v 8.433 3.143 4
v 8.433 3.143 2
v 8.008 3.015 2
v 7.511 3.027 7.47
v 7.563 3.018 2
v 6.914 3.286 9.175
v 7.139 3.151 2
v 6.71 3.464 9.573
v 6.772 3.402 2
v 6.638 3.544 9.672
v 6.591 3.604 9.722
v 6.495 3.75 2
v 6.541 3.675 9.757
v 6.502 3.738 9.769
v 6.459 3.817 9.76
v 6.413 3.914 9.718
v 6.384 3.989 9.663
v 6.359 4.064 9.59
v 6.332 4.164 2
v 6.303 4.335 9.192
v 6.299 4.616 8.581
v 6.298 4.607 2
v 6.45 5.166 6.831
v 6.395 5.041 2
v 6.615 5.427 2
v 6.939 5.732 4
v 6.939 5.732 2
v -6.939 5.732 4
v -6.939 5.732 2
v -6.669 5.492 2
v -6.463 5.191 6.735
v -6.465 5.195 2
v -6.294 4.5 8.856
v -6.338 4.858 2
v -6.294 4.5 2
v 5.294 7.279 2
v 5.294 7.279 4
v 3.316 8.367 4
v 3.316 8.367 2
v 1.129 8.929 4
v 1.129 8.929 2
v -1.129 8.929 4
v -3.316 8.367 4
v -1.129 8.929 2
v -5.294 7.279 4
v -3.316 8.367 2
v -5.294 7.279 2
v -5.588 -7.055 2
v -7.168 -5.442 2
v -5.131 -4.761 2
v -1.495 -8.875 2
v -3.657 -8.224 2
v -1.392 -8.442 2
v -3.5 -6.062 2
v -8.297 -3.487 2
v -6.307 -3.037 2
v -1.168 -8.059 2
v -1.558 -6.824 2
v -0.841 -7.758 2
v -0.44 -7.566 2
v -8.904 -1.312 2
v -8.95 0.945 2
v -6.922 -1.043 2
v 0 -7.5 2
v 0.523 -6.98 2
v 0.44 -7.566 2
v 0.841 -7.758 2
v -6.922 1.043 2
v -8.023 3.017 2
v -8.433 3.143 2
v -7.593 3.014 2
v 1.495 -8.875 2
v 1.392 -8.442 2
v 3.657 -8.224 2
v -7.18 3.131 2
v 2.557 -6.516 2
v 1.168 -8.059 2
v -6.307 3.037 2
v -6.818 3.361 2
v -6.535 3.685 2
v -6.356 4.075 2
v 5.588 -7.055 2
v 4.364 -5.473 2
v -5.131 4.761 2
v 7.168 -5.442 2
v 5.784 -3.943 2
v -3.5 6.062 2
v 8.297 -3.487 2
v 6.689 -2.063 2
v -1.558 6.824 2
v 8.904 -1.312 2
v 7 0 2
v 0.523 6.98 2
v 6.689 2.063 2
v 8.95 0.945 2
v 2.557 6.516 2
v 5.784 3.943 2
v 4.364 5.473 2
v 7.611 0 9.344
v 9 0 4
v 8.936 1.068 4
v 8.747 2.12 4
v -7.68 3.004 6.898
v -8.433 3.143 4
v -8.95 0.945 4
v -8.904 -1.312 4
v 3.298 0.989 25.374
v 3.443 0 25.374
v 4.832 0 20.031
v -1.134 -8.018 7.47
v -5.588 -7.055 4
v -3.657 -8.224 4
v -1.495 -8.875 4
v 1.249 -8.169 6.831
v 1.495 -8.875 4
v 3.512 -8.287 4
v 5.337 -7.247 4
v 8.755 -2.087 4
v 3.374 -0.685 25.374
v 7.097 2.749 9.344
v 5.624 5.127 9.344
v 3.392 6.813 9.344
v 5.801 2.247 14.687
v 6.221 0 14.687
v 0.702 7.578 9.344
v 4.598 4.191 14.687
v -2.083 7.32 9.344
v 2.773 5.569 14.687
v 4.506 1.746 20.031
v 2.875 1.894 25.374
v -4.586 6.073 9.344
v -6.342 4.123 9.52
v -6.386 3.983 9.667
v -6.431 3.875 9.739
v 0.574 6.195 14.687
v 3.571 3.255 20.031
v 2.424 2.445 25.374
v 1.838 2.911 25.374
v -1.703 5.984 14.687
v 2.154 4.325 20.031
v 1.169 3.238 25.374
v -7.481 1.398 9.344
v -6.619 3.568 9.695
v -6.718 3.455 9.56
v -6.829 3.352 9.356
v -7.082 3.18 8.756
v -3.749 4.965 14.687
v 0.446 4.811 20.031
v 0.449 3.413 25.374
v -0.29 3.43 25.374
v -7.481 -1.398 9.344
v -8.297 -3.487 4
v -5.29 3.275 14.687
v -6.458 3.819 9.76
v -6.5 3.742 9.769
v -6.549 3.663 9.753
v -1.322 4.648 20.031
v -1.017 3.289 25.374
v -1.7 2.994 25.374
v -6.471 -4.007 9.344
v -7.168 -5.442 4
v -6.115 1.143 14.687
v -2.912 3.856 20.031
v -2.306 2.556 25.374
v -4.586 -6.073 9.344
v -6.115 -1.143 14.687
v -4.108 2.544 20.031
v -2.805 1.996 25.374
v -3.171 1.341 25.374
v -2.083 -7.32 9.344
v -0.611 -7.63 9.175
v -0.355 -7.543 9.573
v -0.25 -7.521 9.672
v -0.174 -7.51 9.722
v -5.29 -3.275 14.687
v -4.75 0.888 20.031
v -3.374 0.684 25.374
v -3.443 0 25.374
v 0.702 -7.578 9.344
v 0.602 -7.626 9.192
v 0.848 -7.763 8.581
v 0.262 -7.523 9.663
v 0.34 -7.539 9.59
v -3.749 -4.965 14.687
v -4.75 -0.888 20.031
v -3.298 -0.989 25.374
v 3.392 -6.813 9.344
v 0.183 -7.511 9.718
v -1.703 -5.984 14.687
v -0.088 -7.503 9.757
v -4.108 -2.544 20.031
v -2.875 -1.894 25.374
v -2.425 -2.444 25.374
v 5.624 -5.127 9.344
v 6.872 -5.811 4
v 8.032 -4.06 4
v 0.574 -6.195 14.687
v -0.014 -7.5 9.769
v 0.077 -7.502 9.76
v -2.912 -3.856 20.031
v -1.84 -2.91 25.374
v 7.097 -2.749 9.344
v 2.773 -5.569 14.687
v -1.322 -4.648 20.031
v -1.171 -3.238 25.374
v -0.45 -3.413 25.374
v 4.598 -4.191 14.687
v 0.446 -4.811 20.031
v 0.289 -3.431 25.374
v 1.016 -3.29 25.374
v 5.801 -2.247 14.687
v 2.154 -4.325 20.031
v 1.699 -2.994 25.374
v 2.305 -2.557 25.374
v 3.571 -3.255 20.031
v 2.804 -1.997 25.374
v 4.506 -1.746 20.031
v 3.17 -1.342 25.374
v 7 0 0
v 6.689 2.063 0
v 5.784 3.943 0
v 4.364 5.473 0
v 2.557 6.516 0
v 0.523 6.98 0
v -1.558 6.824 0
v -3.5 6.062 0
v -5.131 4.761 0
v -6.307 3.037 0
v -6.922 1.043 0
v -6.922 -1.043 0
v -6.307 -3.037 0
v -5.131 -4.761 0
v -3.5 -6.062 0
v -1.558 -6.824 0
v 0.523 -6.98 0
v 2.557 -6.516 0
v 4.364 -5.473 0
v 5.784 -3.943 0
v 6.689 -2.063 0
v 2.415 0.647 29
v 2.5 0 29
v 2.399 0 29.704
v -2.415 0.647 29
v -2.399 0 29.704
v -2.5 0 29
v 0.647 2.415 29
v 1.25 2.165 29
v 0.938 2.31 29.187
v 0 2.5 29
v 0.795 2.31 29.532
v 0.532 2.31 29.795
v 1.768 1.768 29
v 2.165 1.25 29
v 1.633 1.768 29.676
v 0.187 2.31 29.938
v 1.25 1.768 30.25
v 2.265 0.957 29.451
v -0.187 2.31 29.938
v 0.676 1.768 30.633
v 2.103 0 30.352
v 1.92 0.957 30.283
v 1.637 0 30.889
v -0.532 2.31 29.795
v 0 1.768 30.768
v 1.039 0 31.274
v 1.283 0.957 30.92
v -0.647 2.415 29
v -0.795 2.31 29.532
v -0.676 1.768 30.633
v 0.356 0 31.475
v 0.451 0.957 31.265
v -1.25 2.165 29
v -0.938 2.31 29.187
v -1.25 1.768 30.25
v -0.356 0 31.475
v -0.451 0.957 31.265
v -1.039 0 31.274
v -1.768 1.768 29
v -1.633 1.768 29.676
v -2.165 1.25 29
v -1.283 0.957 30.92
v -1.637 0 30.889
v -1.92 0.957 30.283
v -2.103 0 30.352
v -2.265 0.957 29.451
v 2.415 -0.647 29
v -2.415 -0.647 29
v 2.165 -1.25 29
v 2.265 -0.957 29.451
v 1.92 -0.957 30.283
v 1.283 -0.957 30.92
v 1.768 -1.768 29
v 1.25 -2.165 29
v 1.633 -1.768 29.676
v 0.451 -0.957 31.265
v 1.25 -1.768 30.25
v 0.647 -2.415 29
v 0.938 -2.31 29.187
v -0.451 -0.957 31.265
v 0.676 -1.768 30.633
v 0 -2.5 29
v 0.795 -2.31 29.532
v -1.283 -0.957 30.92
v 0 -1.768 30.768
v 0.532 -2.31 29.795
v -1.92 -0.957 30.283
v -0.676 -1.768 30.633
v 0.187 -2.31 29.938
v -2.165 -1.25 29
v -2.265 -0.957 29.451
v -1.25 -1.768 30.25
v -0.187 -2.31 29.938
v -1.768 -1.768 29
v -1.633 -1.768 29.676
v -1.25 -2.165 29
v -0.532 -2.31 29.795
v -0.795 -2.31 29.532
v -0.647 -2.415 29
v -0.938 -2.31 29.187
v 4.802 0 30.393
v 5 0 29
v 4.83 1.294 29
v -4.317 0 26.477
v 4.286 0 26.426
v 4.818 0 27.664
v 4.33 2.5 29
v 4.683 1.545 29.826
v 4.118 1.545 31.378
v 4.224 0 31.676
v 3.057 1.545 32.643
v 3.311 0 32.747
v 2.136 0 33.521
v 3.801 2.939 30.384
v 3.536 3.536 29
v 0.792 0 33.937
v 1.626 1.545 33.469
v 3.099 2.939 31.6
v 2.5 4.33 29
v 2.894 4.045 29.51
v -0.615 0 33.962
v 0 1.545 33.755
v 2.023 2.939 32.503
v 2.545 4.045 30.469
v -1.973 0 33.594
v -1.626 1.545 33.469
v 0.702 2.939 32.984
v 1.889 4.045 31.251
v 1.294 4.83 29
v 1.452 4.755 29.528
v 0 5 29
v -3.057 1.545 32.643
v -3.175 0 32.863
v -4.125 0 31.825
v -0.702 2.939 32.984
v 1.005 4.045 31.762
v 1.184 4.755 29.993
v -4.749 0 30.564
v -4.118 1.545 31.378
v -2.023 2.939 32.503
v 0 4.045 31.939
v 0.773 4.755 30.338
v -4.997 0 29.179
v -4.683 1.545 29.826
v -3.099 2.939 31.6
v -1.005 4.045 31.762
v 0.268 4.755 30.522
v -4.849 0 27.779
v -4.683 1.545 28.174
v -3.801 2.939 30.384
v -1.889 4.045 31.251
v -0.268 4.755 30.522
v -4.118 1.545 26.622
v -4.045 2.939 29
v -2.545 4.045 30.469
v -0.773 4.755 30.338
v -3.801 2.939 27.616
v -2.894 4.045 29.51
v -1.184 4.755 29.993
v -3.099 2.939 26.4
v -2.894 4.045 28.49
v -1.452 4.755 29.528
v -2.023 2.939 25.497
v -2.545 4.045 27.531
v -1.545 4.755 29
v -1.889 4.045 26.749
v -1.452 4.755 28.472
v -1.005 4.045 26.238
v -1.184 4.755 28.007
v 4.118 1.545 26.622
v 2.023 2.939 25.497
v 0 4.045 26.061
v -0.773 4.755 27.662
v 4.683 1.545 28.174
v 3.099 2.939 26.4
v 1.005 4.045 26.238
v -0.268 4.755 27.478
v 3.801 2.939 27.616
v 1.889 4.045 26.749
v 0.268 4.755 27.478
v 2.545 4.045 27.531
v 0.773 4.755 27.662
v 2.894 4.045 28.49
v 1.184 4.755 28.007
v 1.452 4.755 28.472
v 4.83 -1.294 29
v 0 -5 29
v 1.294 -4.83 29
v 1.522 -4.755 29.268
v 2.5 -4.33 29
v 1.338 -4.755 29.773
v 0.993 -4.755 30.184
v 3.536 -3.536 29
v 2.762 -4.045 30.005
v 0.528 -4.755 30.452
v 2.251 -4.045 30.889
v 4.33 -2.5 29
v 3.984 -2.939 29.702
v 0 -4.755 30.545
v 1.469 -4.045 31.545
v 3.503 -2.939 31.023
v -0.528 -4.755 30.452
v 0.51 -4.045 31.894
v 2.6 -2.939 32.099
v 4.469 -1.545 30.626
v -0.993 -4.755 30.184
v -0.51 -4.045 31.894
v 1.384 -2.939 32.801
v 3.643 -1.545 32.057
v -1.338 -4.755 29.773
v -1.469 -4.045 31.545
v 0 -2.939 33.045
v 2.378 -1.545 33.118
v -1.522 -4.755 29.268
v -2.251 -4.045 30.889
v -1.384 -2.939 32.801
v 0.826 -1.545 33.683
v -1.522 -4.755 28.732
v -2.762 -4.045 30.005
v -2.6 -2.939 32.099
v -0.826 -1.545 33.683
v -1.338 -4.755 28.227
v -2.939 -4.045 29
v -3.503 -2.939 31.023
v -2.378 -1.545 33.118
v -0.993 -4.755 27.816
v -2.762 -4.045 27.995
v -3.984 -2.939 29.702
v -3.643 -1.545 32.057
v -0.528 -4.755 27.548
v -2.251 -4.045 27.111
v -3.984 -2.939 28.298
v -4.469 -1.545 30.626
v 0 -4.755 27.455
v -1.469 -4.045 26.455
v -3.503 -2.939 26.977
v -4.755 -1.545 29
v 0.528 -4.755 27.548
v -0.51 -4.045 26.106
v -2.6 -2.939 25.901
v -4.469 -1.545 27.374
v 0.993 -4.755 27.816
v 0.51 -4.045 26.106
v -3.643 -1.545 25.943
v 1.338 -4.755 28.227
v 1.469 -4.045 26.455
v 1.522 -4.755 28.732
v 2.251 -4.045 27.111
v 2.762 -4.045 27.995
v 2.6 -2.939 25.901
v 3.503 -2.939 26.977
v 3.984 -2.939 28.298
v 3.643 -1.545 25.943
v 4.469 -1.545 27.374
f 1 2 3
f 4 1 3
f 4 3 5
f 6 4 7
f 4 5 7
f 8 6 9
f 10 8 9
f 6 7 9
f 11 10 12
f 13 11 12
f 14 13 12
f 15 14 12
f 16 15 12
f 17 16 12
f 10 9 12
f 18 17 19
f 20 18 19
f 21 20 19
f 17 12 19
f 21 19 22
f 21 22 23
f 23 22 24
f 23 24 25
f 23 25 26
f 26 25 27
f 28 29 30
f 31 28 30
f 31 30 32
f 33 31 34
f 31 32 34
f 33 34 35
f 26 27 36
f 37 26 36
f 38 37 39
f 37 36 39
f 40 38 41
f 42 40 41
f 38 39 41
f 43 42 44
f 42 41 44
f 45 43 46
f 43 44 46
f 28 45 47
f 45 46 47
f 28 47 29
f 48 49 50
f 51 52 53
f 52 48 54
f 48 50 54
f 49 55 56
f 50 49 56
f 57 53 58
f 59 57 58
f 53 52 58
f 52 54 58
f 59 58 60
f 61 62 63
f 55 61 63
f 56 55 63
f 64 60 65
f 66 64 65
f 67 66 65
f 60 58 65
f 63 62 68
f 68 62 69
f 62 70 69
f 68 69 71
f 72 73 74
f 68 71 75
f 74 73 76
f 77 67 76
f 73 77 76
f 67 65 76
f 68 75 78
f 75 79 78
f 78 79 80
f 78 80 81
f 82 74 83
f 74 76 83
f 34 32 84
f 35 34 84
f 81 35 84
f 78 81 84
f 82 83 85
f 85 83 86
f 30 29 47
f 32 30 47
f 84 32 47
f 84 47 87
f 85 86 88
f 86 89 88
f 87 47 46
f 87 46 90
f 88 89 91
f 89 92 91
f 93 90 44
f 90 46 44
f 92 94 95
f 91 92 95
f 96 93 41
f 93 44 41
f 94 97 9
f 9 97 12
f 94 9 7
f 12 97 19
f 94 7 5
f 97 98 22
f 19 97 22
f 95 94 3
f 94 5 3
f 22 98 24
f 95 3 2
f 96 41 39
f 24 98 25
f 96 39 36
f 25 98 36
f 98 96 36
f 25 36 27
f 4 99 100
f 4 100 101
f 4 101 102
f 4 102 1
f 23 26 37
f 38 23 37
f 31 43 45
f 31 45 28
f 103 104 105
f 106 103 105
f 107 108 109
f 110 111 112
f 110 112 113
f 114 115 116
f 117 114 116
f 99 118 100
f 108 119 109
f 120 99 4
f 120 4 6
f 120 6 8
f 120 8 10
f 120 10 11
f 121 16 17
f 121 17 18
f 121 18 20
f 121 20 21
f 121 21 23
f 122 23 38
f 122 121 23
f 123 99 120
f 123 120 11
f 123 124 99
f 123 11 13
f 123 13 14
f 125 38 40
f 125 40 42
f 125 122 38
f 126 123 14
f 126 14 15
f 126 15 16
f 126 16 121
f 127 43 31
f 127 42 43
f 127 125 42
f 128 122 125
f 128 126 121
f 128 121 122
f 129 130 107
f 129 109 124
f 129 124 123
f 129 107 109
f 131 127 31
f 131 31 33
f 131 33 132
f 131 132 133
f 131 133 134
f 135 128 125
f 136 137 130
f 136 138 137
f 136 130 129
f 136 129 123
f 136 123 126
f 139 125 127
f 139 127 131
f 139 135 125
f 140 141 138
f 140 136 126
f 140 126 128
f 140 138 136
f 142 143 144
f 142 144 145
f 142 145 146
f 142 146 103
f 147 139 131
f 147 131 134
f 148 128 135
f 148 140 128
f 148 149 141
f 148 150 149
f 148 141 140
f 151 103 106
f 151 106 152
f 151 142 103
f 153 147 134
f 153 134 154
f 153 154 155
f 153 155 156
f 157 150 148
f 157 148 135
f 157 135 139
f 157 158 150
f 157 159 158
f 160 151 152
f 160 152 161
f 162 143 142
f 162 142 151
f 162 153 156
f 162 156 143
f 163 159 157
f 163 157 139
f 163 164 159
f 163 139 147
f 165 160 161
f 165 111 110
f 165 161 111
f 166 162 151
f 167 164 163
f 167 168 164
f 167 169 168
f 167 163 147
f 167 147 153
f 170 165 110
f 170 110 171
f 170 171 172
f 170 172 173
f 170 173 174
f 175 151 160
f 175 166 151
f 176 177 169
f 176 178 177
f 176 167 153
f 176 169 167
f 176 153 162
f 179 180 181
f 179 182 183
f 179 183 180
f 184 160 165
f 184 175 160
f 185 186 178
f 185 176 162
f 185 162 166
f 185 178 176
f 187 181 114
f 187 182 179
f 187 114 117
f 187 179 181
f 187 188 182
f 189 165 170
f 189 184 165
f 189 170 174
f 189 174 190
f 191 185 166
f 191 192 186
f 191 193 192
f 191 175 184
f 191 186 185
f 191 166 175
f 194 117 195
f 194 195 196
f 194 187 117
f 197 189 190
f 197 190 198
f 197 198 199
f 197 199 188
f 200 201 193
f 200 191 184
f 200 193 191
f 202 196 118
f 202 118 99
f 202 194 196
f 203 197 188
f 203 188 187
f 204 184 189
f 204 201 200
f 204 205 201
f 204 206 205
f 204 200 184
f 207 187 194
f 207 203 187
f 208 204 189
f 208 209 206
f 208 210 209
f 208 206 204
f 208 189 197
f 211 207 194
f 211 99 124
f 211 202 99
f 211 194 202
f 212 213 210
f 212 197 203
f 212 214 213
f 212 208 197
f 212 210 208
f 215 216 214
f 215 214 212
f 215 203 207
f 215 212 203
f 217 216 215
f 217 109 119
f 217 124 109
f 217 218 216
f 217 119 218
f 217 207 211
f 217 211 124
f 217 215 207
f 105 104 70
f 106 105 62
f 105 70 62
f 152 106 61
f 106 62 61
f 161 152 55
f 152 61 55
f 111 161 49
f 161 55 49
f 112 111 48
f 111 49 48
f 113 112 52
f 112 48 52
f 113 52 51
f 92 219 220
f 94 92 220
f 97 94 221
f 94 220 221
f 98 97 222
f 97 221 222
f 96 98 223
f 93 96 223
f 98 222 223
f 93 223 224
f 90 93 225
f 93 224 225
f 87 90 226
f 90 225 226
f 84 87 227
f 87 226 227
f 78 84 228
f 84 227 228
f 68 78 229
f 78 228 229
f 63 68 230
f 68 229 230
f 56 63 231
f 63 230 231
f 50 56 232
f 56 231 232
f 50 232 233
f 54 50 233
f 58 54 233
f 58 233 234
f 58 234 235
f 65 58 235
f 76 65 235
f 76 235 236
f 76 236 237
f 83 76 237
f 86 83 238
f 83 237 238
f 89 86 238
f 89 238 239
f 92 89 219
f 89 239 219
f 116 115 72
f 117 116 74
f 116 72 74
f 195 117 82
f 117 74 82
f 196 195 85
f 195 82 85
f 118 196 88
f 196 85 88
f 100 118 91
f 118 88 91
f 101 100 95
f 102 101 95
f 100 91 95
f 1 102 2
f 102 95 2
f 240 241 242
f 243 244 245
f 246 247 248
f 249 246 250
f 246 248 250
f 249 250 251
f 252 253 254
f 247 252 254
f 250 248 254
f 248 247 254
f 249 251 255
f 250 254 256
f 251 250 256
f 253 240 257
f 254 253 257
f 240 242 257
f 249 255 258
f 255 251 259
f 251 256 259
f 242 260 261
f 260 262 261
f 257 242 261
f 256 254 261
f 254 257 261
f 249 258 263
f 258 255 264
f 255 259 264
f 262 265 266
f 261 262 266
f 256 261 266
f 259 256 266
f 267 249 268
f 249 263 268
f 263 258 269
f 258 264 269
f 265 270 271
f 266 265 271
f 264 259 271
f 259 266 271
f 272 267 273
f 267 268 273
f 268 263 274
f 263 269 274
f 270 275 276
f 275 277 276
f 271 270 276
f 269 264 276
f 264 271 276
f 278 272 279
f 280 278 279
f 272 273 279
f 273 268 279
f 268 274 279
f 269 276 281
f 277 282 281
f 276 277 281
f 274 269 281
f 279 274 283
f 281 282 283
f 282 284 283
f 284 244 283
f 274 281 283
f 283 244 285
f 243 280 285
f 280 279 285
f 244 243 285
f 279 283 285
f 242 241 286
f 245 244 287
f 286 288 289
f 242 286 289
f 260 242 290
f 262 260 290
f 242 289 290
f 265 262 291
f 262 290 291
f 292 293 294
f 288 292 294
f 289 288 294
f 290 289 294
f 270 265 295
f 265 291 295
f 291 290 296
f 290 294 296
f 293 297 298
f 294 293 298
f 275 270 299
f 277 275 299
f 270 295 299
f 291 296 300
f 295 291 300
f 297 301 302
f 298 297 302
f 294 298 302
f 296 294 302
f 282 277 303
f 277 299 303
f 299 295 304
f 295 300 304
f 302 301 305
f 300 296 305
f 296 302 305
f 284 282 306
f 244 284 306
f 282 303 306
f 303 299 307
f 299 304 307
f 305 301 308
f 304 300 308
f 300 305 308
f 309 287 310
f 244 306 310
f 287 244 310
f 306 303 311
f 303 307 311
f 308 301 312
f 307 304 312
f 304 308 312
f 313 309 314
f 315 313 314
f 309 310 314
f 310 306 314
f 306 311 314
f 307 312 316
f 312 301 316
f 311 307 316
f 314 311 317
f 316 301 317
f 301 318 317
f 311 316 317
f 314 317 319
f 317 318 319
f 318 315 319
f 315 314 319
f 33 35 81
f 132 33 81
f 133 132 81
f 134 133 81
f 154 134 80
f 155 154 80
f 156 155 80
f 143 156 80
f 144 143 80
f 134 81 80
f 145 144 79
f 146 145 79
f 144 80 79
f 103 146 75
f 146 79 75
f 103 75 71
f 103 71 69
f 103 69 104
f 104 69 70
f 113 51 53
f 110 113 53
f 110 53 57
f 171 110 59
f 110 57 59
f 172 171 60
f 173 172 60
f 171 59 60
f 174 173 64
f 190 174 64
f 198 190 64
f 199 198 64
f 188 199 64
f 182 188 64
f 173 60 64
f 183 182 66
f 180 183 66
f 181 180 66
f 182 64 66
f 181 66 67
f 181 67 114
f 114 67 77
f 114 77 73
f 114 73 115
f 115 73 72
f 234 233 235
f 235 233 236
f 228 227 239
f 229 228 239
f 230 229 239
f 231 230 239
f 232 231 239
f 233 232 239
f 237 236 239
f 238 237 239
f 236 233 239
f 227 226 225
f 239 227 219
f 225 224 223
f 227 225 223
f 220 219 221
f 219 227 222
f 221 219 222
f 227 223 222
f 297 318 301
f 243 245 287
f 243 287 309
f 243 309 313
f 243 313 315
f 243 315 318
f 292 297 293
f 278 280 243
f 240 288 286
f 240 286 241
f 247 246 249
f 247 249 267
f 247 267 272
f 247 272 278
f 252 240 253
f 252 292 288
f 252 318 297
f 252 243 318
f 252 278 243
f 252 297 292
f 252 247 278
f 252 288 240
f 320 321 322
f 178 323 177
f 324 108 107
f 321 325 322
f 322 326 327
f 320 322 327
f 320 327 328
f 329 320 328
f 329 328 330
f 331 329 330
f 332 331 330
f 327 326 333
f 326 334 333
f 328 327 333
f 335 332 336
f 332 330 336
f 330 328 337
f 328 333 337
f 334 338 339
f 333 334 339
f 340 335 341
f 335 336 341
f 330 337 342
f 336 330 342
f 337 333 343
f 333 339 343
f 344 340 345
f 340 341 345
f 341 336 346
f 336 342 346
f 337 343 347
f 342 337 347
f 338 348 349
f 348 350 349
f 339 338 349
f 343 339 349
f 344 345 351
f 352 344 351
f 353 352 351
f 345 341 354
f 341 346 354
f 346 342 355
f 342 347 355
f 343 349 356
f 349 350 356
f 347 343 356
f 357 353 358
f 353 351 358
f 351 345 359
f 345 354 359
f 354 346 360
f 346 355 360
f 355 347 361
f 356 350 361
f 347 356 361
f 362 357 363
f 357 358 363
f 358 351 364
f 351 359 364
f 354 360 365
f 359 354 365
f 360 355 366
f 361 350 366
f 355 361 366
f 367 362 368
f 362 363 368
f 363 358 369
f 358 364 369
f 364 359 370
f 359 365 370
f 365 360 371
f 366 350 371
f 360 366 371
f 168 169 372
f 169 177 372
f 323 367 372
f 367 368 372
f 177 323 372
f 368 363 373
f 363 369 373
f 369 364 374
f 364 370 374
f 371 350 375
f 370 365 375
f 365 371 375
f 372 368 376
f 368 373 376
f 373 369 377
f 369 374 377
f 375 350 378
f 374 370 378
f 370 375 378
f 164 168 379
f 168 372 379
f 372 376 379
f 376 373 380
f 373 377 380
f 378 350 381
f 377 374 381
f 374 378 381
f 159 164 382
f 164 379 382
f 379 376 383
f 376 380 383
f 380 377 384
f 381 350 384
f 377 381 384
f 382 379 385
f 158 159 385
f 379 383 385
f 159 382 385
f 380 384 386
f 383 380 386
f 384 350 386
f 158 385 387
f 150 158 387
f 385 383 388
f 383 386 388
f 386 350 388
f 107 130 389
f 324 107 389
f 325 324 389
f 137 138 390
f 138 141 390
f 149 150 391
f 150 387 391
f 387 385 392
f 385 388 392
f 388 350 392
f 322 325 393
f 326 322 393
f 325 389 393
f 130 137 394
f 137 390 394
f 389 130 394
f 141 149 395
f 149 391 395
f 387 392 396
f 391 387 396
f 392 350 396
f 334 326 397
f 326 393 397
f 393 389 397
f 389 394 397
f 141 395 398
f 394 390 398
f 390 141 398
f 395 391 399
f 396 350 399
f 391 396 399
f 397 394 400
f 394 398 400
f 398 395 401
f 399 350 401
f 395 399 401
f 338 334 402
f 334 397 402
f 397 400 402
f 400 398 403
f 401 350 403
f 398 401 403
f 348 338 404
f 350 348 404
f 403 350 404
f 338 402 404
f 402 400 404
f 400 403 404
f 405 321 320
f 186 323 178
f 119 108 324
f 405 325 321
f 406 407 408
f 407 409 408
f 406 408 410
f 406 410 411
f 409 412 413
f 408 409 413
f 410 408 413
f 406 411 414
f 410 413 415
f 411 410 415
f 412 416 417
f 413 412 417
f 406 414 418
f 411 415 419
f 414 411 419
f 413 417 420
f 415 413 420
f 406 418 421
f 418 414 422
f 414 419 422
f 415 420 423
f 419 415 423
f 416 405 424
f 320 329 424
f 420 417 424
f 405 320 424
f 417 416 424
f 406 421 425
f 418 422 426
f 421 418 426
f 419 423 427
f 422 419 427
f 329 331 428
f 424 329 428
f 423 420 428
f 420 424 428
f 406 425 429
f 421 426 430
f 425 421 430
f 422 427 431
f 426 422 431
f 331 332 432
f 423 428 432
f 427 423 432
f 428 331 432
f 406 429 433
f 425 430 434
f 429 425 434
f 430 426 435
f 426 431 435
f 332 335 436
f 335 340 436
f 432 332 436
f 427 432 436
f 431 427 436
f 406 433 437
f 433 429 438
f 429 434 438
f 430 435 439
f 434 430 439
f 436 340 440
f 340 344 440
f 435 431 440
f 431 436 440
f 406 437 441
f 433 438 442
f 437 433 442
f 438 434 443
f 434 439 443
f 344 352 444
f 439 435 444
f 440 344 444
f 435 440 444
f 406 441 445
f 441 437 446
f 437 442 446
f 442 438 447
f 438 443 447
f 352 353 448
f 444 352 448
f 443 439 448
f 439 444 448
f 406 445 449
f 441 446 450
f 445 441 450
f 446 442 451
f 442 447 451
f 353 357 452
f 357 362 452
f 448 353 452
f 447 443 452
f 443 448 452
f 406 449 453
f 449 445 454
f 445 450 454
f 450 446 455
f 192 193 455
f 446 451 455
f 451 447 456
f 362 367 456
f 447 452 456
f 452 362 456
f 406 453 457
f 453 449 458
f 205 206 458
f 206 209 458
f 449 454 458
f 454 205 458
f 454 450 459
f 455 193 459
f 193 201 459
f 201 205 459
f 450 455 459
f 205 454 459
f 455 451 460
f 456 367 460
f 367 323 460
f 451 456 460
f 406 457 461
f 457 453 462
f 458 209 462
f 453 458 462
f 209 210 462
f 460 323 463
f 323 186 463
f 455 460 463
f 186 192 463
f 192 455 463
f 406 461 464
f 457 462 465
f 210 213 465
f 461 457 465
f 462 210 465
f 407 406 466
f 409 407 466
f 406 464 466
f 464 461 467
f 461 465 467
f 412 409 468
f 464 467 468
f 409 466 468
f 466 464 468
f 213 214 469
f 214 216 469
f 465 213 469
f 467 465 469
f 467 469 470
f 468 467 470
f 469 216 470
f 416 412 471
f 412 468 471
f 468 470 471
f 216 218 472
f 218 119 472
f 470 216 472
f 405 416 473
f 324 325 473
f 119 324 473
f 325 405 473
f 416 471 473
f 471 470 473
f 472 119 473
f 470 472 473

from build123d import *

# Parameters (mm, degrees)
F0_R      = 7
F1_DEPTH  = 2
F2_R      = 9
F2_R_2    = 7
F3_DEPTH  = 2
F3_FACE_R = 9
F5_R      = 2.5
F10_DEPTH = 32.001


with BuildPart() as f1:
    # F0 (on Top) → F1 (new body)
    with BuildSketch(Plane.XY):
        Circle(F0_R)
    extrude(amount=F1_DEPTH)

    # F2 (on face) → F3 (join)
    with BuildSketch(Plane.XY.offset(2)):
        Circle(F2_R)
        Circle(F2_R_2, mode=Mode.SUBTRACT)
        Circle(F2_R_2)
    extrude(amount=F3_DEPTH)

    # F3_face (on face) → F6 section 0
    with BuildSketch(Plane.XY.offset(4)):
        Circle(F3_FACE_R)
    # F5 (on offset) → F6 section 1
    with BuildSketch(Plane.XY.offset(29)):
        Circle(F5_R)
    loft()

    # F7 (on face) → F8 (revolve)
    with BuildSketch(Plane.XY.offset(29)):
        with BuildLine():
            ThreePointArc((0, -5), (3.5355339059, -3.5355339059), (5, 0))
            ThreePointArc((5, 0), (3.5355339059, 3.5355339059), (0, 5))
            Line((0, 5), (0, 2.5))
            ThreePointArc((0, 2.5), (1.767766953, 1.767766953), (2.5, 0))
            ThreePointArc((2.5, 0), (1.767766953, -1.767766953), (0, -2.5))
            Line((0, -2.5), (0, -5))
        make_face()
    revolve(axis=Axis((0, 0, 29), (0, -1, 0)))

    # F9 (on face) → F10 (cut, through all)
    with BuildSketch(Plane(origin=(0, 0, 2), x_dir=(1, 0, 0), z_dir=(0, 0, -1))):
        with BuildLine():
            ThreePointArc((1.4947825929, 8.875), (0, 9), (-1.4947825929, 8.875))
            ThreePointArc((-1.4947825929, 8.875), (0, 7.5), (1.4947825929, 8.875))
        make_face()
        with BuildLine():
            ThreePointArc((1.4947825929, 8.875), (1.4986950806, 8.937445581), (1.5, 9))
            ThreePointArc((1.5, 9), (-0.062554419, 10.4986950806), (-1.4947825929, 8.875))
            ThreePointArc((-1.4947825929, 8.875), (0, 9), (1.4947825929, 8.875))
        make_face()
        with BuildLine():
            ThreePointArc((6.9385841621, -5.7320196986), (7.7942286341, -4.5), (8.433366755, -3.1429803014))
            ThreePointArc((8.433366755, -3.1429803014), (6.4951905284, -3.75), (6.9385841621, -5.7320196986))
        make_face()
        with BuildLine():
            ThreePointArc((9.2942286341, -4.5), (9.0608594369, -3.6964787437), (8.433366755, -3.1429803014))
            ThreePointArc((8.433366755, -3.1429803014), (7.7942286341, -4.5), (6.9385841621, -5.7320196986))
            ThreePointArc((6.9385841621, -5.7320196986), (8.4894024584, -5.8291852218), (9.2942286341, -4.5))
        make_face()
        with BuildLine():
            ThreePointArc((-6.2942286341, -4.5), (-6.9907073778, -3.2333691972), (-8.433366755, -3.1429803014))
            ThreePointArc((-8.433366755, -3.1429803014), (-7.7942286341, -4.5), (-6.9385841621, -5.7320196986))
            ThreePointArc((-6.9385841621, -5.7320196986), (-6.4650434122, -5.1951738244), (-6.2942286341, -4.5))
        make_face()
        with BuildLine():
            ThreePointArc((-6.9385841621, -5.7320196986), (-7.7942286341, -4.5), (-8.433366755, -3.1429803014))
            ThreePointArc((-8.433366755, -3.1429803014), (-9.0932667397, -5.25), (-6.9385841621, -5.7320196986))
        make_face()
    extrude(amount=-F10_DEPTH, mode=Mode.SUBTRACT)


solid = f1.part
